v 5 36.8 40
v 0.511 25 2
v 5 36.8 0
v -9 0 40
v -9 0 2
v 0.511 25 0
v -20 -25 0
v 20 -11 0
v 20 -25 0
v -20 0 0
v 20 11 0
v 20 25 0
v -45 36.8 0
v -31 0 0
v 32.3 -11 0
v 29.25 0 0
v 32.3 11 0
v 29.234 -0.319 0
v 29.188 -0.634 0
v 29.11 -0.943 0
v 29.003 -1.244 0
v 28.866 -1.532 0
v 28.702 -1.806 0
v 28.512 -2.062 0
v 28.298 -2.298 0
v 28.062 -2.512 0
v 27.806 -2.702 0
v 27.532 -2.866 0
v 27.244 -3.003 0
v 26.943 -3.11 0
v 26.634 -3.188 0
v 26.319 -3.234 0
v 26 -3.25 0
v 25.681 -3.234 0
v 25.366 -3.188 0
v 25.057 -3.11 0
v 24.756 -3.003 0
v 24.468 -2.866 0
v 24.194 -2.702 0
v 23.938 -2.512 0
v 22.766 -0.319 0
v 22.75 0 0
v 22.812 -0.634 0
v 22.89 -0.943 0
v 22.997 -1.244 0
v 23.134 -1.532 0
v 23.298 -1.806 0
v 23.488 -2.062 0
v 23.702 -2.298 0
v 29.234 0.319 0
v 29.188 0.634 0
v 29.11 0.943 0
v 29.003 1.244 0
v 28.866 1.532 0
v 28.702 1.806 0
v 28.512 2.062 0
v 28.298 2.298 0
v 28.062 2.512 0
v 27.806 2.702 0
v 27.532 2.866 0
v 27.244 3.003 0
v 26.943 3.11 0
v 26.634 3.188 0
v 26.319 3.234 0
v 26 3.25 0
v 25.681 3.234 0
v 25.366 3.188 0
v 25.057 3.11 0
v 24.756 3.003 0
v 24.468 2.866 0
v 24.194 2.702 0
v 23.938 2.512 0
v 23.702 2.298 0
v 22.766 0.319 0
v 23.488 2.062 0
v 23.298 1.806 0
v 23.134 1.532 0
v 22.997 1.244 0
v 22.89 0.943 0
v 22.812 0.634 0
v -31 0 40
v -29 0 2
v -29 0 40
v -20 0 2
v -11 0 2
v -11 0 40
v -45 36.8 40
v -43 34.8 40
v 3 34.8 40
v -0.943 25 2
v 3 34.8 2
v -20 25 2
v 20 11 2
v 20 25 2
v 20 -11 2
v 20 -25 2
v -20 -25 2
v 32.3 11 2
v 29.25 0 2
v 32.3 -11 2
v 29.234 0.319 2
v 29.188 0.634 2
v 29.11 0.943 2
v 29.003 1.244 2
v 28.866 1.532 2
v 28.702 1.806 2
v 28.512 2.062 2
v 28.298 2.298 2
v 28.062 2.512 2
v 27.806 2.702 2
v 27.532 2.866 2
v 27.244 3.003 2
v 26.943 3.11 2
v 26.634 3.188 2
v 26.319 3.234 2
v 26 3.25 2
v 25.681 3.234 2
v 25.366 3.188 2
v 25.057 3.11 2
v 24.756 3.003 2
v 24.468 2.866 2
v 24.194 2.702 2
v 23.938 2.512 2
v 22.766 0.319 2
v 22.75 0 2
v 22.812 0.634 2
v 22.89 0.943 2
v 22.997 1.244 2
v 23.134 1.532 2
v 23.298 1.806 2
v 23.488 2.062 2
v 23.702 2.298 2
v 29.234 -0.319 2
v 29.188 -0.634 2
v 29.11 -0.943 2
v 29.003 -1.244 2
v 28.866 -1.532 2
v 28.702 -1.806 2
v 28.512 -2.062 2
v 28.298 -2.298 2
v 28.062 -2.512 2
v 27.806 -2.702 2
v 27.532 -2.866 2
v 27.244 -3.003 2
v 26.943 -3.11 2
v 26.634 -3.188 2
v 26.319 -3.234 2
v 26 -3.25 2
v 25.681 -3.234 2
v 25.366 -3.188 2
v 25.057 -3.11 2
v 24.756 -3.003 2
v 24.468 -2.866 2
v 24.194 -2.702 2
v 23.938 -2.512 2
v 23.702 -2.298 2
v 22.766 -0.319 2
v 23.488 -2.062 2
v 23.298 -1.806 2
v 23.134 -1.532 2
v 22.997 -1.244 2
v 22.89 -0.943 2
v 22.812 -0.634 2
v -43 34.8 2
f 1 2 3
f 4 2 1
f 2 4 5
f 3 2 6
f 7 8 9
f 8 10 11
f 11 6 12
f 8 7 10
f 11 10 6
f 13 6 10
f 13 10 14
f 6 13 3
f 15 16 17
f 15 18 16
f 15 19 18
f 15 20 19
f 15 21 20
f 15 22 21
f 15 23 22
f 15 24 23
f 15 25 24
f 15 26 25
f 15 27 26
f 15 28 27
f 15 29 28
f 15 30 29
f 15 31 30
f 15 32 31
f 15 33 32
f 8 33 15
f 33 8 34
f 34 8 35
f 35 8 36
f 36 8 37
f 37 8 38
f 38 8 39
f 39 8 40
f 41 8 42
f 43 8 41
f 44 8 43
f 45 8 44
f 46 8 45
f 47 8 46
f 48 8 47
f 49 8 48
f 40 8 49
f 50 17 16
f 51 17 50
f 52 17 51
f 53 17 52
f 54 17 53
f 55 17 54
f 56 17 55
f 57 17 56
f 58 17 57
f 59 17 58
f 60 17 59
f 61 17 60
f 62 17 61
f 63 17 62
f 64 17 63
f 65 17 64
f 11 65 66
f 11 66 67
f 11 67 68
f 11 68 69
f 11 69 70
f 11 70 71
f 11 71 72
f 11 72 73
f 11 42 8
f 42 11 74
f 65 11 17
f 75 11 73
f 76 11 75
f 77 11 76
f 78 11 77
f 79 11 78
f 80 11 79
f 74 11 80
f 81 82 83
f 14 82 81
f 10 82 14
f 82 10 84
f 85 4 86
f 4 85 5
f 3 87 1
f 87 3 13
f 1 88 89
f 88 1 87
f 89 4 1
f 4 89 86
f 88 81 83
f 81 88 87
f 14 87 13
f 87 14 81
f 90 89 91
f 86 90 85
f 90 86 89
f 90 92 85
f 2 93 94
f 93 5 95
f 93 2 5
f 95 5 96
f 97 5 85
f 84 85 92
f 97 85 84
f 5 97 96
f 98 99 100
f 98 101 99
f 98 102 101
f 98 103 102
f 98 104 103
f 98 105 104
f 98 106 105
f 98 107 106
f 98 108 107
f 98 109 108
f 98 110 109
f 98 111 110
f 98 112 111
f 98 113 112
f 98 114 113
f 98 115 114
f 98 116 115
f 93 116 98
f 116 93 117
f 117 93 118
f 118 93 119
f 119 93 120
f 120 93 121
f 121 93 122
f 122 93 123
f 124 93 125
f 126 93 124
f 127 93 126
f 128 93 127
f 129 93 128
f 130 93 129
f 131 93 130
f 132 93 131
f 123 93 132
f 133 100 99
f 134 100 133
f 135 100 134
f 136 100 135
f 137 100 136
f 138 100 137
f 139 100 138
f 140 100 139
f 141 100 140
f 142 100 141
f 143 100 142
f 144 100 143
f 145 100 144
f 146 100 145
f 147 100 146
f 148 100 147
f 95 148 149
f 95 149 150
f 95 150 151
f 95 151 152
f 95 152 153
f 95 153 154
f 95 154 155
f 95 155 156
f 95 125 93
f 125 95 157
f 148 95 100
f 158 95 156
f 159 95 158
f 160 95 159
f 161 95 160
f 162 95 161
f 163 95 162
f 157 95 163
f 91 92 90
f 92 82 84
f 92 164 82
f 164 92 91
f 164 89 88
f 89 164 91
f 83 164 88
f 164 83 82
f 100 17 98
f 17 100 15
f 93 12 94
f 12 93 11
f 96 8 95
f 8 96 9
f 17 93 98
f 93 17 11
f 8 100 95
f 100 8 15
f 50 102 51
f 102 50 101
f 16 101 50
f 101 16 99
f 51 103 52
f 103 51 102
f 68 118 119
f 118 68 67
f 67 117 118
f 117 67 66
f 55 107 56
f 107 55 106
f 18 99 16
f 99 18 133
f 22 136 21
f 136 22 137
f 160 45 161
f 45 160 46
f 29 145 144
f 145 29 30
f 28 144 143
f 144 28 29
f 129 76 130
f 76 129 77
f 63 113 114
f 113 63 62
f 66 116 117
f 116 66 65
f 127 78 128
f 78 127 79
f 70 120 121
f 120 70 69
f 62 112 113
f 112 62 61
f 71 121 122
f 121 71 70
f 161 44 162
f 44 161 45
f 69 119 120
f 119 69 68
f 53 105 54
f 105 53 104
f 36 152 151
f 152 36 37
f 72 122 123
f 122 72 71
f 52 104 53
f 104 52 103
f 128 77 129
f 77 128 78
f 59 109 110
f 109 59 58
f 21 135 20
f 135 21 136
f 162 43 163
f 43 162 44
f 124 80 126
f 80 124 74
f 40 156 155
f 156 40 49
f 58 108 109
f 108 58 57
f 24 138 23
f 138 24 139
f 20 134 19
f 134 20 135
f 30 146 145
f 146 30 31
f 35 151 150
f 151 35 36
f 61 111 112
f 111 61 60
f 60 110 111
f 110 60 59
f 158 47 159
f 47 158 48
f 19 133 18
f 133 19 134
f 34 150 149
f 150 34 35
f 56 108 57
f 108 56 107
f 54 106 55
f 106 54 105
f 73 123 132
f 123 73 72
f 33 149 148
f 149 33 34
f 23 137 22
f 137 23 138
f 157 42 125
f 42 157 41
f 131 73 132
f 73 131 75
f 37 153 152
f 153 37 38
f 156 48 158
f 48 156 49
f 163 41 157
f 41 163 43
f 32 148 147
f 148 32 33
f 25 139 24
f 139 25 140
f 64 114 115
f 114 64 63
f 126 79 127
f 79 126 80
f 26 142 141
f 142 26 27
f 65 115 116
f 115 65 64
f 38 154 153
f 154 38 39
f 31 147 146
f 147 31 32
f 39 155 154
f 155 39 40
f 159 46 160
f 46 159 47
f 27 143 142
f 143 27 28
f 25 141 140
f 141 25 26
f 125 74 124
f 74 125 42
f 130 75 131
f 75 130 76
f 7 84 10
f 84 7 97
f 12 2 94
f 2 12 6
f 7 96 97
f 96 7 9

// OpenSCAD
$fn=64;

bbox_x = 52.3;
bbox_y = 50.0;
bbox_z = 38.8;

th = 2.0;

base_len = 40.0;
tab_len  = bbox_x - base_len; // 12.3

base_w = bbox_y;              // 50
tab_w  = 22.0;

base_t = th;
tab_t  = th;

wall_len = base_len;
wall_h = bbox_z - base_t;     // 36.8
wall_t = th;

inner_bottom_w = 18.0;
outer_bottom_w = inner_bottom_w + 2*wall_t;

outer_top_w = bbox_y;         // 50
inner_top_w = outer_top_w - 2*wall_t;

hole_d = 6.5;
hole_x_from_tab_end = 6.0;

module trapezoid_prism(len, w1, w2, h){
    linear_extrude(height=len, center=false, convexity=10)
        polygon(points=[
            [-w1/2, 0],
            [ w1/2, 0],
            [ w2/2, h],
            [-w2/2, h]
        ]);
}

module v_channel(){
    difference(){
        translate([-base_len/2, 0, 0])
            trapezoid_prism(base_len, outer_bottom_w, outer_top_w, wall_h);
        translate([-base_len/2, 0, wall_t])
            trapezoid_prism(base_len, inner_bottom_w, inner_top_w, wall_h - wall_t);
    }
}

module base_plate(){
    translate([-base_len/2, -base_w/2, 0])
        cube([base_len, base_w, base_t], center=false);
}

module mounting_tab(){
    difference(){
        translate([base_len/2, -tab_w/2, 0])
            cube([tab_len, tab_w, tab_t], center=false);
        translate([base_len/2 + hole_x_from_tab_end, 0, -1])
            cylinder(d=hole_d, h=tab_t+2, center=false);
    }
}

union(){
    base_plate();
    v_channel();
    mounting_tab();
}
